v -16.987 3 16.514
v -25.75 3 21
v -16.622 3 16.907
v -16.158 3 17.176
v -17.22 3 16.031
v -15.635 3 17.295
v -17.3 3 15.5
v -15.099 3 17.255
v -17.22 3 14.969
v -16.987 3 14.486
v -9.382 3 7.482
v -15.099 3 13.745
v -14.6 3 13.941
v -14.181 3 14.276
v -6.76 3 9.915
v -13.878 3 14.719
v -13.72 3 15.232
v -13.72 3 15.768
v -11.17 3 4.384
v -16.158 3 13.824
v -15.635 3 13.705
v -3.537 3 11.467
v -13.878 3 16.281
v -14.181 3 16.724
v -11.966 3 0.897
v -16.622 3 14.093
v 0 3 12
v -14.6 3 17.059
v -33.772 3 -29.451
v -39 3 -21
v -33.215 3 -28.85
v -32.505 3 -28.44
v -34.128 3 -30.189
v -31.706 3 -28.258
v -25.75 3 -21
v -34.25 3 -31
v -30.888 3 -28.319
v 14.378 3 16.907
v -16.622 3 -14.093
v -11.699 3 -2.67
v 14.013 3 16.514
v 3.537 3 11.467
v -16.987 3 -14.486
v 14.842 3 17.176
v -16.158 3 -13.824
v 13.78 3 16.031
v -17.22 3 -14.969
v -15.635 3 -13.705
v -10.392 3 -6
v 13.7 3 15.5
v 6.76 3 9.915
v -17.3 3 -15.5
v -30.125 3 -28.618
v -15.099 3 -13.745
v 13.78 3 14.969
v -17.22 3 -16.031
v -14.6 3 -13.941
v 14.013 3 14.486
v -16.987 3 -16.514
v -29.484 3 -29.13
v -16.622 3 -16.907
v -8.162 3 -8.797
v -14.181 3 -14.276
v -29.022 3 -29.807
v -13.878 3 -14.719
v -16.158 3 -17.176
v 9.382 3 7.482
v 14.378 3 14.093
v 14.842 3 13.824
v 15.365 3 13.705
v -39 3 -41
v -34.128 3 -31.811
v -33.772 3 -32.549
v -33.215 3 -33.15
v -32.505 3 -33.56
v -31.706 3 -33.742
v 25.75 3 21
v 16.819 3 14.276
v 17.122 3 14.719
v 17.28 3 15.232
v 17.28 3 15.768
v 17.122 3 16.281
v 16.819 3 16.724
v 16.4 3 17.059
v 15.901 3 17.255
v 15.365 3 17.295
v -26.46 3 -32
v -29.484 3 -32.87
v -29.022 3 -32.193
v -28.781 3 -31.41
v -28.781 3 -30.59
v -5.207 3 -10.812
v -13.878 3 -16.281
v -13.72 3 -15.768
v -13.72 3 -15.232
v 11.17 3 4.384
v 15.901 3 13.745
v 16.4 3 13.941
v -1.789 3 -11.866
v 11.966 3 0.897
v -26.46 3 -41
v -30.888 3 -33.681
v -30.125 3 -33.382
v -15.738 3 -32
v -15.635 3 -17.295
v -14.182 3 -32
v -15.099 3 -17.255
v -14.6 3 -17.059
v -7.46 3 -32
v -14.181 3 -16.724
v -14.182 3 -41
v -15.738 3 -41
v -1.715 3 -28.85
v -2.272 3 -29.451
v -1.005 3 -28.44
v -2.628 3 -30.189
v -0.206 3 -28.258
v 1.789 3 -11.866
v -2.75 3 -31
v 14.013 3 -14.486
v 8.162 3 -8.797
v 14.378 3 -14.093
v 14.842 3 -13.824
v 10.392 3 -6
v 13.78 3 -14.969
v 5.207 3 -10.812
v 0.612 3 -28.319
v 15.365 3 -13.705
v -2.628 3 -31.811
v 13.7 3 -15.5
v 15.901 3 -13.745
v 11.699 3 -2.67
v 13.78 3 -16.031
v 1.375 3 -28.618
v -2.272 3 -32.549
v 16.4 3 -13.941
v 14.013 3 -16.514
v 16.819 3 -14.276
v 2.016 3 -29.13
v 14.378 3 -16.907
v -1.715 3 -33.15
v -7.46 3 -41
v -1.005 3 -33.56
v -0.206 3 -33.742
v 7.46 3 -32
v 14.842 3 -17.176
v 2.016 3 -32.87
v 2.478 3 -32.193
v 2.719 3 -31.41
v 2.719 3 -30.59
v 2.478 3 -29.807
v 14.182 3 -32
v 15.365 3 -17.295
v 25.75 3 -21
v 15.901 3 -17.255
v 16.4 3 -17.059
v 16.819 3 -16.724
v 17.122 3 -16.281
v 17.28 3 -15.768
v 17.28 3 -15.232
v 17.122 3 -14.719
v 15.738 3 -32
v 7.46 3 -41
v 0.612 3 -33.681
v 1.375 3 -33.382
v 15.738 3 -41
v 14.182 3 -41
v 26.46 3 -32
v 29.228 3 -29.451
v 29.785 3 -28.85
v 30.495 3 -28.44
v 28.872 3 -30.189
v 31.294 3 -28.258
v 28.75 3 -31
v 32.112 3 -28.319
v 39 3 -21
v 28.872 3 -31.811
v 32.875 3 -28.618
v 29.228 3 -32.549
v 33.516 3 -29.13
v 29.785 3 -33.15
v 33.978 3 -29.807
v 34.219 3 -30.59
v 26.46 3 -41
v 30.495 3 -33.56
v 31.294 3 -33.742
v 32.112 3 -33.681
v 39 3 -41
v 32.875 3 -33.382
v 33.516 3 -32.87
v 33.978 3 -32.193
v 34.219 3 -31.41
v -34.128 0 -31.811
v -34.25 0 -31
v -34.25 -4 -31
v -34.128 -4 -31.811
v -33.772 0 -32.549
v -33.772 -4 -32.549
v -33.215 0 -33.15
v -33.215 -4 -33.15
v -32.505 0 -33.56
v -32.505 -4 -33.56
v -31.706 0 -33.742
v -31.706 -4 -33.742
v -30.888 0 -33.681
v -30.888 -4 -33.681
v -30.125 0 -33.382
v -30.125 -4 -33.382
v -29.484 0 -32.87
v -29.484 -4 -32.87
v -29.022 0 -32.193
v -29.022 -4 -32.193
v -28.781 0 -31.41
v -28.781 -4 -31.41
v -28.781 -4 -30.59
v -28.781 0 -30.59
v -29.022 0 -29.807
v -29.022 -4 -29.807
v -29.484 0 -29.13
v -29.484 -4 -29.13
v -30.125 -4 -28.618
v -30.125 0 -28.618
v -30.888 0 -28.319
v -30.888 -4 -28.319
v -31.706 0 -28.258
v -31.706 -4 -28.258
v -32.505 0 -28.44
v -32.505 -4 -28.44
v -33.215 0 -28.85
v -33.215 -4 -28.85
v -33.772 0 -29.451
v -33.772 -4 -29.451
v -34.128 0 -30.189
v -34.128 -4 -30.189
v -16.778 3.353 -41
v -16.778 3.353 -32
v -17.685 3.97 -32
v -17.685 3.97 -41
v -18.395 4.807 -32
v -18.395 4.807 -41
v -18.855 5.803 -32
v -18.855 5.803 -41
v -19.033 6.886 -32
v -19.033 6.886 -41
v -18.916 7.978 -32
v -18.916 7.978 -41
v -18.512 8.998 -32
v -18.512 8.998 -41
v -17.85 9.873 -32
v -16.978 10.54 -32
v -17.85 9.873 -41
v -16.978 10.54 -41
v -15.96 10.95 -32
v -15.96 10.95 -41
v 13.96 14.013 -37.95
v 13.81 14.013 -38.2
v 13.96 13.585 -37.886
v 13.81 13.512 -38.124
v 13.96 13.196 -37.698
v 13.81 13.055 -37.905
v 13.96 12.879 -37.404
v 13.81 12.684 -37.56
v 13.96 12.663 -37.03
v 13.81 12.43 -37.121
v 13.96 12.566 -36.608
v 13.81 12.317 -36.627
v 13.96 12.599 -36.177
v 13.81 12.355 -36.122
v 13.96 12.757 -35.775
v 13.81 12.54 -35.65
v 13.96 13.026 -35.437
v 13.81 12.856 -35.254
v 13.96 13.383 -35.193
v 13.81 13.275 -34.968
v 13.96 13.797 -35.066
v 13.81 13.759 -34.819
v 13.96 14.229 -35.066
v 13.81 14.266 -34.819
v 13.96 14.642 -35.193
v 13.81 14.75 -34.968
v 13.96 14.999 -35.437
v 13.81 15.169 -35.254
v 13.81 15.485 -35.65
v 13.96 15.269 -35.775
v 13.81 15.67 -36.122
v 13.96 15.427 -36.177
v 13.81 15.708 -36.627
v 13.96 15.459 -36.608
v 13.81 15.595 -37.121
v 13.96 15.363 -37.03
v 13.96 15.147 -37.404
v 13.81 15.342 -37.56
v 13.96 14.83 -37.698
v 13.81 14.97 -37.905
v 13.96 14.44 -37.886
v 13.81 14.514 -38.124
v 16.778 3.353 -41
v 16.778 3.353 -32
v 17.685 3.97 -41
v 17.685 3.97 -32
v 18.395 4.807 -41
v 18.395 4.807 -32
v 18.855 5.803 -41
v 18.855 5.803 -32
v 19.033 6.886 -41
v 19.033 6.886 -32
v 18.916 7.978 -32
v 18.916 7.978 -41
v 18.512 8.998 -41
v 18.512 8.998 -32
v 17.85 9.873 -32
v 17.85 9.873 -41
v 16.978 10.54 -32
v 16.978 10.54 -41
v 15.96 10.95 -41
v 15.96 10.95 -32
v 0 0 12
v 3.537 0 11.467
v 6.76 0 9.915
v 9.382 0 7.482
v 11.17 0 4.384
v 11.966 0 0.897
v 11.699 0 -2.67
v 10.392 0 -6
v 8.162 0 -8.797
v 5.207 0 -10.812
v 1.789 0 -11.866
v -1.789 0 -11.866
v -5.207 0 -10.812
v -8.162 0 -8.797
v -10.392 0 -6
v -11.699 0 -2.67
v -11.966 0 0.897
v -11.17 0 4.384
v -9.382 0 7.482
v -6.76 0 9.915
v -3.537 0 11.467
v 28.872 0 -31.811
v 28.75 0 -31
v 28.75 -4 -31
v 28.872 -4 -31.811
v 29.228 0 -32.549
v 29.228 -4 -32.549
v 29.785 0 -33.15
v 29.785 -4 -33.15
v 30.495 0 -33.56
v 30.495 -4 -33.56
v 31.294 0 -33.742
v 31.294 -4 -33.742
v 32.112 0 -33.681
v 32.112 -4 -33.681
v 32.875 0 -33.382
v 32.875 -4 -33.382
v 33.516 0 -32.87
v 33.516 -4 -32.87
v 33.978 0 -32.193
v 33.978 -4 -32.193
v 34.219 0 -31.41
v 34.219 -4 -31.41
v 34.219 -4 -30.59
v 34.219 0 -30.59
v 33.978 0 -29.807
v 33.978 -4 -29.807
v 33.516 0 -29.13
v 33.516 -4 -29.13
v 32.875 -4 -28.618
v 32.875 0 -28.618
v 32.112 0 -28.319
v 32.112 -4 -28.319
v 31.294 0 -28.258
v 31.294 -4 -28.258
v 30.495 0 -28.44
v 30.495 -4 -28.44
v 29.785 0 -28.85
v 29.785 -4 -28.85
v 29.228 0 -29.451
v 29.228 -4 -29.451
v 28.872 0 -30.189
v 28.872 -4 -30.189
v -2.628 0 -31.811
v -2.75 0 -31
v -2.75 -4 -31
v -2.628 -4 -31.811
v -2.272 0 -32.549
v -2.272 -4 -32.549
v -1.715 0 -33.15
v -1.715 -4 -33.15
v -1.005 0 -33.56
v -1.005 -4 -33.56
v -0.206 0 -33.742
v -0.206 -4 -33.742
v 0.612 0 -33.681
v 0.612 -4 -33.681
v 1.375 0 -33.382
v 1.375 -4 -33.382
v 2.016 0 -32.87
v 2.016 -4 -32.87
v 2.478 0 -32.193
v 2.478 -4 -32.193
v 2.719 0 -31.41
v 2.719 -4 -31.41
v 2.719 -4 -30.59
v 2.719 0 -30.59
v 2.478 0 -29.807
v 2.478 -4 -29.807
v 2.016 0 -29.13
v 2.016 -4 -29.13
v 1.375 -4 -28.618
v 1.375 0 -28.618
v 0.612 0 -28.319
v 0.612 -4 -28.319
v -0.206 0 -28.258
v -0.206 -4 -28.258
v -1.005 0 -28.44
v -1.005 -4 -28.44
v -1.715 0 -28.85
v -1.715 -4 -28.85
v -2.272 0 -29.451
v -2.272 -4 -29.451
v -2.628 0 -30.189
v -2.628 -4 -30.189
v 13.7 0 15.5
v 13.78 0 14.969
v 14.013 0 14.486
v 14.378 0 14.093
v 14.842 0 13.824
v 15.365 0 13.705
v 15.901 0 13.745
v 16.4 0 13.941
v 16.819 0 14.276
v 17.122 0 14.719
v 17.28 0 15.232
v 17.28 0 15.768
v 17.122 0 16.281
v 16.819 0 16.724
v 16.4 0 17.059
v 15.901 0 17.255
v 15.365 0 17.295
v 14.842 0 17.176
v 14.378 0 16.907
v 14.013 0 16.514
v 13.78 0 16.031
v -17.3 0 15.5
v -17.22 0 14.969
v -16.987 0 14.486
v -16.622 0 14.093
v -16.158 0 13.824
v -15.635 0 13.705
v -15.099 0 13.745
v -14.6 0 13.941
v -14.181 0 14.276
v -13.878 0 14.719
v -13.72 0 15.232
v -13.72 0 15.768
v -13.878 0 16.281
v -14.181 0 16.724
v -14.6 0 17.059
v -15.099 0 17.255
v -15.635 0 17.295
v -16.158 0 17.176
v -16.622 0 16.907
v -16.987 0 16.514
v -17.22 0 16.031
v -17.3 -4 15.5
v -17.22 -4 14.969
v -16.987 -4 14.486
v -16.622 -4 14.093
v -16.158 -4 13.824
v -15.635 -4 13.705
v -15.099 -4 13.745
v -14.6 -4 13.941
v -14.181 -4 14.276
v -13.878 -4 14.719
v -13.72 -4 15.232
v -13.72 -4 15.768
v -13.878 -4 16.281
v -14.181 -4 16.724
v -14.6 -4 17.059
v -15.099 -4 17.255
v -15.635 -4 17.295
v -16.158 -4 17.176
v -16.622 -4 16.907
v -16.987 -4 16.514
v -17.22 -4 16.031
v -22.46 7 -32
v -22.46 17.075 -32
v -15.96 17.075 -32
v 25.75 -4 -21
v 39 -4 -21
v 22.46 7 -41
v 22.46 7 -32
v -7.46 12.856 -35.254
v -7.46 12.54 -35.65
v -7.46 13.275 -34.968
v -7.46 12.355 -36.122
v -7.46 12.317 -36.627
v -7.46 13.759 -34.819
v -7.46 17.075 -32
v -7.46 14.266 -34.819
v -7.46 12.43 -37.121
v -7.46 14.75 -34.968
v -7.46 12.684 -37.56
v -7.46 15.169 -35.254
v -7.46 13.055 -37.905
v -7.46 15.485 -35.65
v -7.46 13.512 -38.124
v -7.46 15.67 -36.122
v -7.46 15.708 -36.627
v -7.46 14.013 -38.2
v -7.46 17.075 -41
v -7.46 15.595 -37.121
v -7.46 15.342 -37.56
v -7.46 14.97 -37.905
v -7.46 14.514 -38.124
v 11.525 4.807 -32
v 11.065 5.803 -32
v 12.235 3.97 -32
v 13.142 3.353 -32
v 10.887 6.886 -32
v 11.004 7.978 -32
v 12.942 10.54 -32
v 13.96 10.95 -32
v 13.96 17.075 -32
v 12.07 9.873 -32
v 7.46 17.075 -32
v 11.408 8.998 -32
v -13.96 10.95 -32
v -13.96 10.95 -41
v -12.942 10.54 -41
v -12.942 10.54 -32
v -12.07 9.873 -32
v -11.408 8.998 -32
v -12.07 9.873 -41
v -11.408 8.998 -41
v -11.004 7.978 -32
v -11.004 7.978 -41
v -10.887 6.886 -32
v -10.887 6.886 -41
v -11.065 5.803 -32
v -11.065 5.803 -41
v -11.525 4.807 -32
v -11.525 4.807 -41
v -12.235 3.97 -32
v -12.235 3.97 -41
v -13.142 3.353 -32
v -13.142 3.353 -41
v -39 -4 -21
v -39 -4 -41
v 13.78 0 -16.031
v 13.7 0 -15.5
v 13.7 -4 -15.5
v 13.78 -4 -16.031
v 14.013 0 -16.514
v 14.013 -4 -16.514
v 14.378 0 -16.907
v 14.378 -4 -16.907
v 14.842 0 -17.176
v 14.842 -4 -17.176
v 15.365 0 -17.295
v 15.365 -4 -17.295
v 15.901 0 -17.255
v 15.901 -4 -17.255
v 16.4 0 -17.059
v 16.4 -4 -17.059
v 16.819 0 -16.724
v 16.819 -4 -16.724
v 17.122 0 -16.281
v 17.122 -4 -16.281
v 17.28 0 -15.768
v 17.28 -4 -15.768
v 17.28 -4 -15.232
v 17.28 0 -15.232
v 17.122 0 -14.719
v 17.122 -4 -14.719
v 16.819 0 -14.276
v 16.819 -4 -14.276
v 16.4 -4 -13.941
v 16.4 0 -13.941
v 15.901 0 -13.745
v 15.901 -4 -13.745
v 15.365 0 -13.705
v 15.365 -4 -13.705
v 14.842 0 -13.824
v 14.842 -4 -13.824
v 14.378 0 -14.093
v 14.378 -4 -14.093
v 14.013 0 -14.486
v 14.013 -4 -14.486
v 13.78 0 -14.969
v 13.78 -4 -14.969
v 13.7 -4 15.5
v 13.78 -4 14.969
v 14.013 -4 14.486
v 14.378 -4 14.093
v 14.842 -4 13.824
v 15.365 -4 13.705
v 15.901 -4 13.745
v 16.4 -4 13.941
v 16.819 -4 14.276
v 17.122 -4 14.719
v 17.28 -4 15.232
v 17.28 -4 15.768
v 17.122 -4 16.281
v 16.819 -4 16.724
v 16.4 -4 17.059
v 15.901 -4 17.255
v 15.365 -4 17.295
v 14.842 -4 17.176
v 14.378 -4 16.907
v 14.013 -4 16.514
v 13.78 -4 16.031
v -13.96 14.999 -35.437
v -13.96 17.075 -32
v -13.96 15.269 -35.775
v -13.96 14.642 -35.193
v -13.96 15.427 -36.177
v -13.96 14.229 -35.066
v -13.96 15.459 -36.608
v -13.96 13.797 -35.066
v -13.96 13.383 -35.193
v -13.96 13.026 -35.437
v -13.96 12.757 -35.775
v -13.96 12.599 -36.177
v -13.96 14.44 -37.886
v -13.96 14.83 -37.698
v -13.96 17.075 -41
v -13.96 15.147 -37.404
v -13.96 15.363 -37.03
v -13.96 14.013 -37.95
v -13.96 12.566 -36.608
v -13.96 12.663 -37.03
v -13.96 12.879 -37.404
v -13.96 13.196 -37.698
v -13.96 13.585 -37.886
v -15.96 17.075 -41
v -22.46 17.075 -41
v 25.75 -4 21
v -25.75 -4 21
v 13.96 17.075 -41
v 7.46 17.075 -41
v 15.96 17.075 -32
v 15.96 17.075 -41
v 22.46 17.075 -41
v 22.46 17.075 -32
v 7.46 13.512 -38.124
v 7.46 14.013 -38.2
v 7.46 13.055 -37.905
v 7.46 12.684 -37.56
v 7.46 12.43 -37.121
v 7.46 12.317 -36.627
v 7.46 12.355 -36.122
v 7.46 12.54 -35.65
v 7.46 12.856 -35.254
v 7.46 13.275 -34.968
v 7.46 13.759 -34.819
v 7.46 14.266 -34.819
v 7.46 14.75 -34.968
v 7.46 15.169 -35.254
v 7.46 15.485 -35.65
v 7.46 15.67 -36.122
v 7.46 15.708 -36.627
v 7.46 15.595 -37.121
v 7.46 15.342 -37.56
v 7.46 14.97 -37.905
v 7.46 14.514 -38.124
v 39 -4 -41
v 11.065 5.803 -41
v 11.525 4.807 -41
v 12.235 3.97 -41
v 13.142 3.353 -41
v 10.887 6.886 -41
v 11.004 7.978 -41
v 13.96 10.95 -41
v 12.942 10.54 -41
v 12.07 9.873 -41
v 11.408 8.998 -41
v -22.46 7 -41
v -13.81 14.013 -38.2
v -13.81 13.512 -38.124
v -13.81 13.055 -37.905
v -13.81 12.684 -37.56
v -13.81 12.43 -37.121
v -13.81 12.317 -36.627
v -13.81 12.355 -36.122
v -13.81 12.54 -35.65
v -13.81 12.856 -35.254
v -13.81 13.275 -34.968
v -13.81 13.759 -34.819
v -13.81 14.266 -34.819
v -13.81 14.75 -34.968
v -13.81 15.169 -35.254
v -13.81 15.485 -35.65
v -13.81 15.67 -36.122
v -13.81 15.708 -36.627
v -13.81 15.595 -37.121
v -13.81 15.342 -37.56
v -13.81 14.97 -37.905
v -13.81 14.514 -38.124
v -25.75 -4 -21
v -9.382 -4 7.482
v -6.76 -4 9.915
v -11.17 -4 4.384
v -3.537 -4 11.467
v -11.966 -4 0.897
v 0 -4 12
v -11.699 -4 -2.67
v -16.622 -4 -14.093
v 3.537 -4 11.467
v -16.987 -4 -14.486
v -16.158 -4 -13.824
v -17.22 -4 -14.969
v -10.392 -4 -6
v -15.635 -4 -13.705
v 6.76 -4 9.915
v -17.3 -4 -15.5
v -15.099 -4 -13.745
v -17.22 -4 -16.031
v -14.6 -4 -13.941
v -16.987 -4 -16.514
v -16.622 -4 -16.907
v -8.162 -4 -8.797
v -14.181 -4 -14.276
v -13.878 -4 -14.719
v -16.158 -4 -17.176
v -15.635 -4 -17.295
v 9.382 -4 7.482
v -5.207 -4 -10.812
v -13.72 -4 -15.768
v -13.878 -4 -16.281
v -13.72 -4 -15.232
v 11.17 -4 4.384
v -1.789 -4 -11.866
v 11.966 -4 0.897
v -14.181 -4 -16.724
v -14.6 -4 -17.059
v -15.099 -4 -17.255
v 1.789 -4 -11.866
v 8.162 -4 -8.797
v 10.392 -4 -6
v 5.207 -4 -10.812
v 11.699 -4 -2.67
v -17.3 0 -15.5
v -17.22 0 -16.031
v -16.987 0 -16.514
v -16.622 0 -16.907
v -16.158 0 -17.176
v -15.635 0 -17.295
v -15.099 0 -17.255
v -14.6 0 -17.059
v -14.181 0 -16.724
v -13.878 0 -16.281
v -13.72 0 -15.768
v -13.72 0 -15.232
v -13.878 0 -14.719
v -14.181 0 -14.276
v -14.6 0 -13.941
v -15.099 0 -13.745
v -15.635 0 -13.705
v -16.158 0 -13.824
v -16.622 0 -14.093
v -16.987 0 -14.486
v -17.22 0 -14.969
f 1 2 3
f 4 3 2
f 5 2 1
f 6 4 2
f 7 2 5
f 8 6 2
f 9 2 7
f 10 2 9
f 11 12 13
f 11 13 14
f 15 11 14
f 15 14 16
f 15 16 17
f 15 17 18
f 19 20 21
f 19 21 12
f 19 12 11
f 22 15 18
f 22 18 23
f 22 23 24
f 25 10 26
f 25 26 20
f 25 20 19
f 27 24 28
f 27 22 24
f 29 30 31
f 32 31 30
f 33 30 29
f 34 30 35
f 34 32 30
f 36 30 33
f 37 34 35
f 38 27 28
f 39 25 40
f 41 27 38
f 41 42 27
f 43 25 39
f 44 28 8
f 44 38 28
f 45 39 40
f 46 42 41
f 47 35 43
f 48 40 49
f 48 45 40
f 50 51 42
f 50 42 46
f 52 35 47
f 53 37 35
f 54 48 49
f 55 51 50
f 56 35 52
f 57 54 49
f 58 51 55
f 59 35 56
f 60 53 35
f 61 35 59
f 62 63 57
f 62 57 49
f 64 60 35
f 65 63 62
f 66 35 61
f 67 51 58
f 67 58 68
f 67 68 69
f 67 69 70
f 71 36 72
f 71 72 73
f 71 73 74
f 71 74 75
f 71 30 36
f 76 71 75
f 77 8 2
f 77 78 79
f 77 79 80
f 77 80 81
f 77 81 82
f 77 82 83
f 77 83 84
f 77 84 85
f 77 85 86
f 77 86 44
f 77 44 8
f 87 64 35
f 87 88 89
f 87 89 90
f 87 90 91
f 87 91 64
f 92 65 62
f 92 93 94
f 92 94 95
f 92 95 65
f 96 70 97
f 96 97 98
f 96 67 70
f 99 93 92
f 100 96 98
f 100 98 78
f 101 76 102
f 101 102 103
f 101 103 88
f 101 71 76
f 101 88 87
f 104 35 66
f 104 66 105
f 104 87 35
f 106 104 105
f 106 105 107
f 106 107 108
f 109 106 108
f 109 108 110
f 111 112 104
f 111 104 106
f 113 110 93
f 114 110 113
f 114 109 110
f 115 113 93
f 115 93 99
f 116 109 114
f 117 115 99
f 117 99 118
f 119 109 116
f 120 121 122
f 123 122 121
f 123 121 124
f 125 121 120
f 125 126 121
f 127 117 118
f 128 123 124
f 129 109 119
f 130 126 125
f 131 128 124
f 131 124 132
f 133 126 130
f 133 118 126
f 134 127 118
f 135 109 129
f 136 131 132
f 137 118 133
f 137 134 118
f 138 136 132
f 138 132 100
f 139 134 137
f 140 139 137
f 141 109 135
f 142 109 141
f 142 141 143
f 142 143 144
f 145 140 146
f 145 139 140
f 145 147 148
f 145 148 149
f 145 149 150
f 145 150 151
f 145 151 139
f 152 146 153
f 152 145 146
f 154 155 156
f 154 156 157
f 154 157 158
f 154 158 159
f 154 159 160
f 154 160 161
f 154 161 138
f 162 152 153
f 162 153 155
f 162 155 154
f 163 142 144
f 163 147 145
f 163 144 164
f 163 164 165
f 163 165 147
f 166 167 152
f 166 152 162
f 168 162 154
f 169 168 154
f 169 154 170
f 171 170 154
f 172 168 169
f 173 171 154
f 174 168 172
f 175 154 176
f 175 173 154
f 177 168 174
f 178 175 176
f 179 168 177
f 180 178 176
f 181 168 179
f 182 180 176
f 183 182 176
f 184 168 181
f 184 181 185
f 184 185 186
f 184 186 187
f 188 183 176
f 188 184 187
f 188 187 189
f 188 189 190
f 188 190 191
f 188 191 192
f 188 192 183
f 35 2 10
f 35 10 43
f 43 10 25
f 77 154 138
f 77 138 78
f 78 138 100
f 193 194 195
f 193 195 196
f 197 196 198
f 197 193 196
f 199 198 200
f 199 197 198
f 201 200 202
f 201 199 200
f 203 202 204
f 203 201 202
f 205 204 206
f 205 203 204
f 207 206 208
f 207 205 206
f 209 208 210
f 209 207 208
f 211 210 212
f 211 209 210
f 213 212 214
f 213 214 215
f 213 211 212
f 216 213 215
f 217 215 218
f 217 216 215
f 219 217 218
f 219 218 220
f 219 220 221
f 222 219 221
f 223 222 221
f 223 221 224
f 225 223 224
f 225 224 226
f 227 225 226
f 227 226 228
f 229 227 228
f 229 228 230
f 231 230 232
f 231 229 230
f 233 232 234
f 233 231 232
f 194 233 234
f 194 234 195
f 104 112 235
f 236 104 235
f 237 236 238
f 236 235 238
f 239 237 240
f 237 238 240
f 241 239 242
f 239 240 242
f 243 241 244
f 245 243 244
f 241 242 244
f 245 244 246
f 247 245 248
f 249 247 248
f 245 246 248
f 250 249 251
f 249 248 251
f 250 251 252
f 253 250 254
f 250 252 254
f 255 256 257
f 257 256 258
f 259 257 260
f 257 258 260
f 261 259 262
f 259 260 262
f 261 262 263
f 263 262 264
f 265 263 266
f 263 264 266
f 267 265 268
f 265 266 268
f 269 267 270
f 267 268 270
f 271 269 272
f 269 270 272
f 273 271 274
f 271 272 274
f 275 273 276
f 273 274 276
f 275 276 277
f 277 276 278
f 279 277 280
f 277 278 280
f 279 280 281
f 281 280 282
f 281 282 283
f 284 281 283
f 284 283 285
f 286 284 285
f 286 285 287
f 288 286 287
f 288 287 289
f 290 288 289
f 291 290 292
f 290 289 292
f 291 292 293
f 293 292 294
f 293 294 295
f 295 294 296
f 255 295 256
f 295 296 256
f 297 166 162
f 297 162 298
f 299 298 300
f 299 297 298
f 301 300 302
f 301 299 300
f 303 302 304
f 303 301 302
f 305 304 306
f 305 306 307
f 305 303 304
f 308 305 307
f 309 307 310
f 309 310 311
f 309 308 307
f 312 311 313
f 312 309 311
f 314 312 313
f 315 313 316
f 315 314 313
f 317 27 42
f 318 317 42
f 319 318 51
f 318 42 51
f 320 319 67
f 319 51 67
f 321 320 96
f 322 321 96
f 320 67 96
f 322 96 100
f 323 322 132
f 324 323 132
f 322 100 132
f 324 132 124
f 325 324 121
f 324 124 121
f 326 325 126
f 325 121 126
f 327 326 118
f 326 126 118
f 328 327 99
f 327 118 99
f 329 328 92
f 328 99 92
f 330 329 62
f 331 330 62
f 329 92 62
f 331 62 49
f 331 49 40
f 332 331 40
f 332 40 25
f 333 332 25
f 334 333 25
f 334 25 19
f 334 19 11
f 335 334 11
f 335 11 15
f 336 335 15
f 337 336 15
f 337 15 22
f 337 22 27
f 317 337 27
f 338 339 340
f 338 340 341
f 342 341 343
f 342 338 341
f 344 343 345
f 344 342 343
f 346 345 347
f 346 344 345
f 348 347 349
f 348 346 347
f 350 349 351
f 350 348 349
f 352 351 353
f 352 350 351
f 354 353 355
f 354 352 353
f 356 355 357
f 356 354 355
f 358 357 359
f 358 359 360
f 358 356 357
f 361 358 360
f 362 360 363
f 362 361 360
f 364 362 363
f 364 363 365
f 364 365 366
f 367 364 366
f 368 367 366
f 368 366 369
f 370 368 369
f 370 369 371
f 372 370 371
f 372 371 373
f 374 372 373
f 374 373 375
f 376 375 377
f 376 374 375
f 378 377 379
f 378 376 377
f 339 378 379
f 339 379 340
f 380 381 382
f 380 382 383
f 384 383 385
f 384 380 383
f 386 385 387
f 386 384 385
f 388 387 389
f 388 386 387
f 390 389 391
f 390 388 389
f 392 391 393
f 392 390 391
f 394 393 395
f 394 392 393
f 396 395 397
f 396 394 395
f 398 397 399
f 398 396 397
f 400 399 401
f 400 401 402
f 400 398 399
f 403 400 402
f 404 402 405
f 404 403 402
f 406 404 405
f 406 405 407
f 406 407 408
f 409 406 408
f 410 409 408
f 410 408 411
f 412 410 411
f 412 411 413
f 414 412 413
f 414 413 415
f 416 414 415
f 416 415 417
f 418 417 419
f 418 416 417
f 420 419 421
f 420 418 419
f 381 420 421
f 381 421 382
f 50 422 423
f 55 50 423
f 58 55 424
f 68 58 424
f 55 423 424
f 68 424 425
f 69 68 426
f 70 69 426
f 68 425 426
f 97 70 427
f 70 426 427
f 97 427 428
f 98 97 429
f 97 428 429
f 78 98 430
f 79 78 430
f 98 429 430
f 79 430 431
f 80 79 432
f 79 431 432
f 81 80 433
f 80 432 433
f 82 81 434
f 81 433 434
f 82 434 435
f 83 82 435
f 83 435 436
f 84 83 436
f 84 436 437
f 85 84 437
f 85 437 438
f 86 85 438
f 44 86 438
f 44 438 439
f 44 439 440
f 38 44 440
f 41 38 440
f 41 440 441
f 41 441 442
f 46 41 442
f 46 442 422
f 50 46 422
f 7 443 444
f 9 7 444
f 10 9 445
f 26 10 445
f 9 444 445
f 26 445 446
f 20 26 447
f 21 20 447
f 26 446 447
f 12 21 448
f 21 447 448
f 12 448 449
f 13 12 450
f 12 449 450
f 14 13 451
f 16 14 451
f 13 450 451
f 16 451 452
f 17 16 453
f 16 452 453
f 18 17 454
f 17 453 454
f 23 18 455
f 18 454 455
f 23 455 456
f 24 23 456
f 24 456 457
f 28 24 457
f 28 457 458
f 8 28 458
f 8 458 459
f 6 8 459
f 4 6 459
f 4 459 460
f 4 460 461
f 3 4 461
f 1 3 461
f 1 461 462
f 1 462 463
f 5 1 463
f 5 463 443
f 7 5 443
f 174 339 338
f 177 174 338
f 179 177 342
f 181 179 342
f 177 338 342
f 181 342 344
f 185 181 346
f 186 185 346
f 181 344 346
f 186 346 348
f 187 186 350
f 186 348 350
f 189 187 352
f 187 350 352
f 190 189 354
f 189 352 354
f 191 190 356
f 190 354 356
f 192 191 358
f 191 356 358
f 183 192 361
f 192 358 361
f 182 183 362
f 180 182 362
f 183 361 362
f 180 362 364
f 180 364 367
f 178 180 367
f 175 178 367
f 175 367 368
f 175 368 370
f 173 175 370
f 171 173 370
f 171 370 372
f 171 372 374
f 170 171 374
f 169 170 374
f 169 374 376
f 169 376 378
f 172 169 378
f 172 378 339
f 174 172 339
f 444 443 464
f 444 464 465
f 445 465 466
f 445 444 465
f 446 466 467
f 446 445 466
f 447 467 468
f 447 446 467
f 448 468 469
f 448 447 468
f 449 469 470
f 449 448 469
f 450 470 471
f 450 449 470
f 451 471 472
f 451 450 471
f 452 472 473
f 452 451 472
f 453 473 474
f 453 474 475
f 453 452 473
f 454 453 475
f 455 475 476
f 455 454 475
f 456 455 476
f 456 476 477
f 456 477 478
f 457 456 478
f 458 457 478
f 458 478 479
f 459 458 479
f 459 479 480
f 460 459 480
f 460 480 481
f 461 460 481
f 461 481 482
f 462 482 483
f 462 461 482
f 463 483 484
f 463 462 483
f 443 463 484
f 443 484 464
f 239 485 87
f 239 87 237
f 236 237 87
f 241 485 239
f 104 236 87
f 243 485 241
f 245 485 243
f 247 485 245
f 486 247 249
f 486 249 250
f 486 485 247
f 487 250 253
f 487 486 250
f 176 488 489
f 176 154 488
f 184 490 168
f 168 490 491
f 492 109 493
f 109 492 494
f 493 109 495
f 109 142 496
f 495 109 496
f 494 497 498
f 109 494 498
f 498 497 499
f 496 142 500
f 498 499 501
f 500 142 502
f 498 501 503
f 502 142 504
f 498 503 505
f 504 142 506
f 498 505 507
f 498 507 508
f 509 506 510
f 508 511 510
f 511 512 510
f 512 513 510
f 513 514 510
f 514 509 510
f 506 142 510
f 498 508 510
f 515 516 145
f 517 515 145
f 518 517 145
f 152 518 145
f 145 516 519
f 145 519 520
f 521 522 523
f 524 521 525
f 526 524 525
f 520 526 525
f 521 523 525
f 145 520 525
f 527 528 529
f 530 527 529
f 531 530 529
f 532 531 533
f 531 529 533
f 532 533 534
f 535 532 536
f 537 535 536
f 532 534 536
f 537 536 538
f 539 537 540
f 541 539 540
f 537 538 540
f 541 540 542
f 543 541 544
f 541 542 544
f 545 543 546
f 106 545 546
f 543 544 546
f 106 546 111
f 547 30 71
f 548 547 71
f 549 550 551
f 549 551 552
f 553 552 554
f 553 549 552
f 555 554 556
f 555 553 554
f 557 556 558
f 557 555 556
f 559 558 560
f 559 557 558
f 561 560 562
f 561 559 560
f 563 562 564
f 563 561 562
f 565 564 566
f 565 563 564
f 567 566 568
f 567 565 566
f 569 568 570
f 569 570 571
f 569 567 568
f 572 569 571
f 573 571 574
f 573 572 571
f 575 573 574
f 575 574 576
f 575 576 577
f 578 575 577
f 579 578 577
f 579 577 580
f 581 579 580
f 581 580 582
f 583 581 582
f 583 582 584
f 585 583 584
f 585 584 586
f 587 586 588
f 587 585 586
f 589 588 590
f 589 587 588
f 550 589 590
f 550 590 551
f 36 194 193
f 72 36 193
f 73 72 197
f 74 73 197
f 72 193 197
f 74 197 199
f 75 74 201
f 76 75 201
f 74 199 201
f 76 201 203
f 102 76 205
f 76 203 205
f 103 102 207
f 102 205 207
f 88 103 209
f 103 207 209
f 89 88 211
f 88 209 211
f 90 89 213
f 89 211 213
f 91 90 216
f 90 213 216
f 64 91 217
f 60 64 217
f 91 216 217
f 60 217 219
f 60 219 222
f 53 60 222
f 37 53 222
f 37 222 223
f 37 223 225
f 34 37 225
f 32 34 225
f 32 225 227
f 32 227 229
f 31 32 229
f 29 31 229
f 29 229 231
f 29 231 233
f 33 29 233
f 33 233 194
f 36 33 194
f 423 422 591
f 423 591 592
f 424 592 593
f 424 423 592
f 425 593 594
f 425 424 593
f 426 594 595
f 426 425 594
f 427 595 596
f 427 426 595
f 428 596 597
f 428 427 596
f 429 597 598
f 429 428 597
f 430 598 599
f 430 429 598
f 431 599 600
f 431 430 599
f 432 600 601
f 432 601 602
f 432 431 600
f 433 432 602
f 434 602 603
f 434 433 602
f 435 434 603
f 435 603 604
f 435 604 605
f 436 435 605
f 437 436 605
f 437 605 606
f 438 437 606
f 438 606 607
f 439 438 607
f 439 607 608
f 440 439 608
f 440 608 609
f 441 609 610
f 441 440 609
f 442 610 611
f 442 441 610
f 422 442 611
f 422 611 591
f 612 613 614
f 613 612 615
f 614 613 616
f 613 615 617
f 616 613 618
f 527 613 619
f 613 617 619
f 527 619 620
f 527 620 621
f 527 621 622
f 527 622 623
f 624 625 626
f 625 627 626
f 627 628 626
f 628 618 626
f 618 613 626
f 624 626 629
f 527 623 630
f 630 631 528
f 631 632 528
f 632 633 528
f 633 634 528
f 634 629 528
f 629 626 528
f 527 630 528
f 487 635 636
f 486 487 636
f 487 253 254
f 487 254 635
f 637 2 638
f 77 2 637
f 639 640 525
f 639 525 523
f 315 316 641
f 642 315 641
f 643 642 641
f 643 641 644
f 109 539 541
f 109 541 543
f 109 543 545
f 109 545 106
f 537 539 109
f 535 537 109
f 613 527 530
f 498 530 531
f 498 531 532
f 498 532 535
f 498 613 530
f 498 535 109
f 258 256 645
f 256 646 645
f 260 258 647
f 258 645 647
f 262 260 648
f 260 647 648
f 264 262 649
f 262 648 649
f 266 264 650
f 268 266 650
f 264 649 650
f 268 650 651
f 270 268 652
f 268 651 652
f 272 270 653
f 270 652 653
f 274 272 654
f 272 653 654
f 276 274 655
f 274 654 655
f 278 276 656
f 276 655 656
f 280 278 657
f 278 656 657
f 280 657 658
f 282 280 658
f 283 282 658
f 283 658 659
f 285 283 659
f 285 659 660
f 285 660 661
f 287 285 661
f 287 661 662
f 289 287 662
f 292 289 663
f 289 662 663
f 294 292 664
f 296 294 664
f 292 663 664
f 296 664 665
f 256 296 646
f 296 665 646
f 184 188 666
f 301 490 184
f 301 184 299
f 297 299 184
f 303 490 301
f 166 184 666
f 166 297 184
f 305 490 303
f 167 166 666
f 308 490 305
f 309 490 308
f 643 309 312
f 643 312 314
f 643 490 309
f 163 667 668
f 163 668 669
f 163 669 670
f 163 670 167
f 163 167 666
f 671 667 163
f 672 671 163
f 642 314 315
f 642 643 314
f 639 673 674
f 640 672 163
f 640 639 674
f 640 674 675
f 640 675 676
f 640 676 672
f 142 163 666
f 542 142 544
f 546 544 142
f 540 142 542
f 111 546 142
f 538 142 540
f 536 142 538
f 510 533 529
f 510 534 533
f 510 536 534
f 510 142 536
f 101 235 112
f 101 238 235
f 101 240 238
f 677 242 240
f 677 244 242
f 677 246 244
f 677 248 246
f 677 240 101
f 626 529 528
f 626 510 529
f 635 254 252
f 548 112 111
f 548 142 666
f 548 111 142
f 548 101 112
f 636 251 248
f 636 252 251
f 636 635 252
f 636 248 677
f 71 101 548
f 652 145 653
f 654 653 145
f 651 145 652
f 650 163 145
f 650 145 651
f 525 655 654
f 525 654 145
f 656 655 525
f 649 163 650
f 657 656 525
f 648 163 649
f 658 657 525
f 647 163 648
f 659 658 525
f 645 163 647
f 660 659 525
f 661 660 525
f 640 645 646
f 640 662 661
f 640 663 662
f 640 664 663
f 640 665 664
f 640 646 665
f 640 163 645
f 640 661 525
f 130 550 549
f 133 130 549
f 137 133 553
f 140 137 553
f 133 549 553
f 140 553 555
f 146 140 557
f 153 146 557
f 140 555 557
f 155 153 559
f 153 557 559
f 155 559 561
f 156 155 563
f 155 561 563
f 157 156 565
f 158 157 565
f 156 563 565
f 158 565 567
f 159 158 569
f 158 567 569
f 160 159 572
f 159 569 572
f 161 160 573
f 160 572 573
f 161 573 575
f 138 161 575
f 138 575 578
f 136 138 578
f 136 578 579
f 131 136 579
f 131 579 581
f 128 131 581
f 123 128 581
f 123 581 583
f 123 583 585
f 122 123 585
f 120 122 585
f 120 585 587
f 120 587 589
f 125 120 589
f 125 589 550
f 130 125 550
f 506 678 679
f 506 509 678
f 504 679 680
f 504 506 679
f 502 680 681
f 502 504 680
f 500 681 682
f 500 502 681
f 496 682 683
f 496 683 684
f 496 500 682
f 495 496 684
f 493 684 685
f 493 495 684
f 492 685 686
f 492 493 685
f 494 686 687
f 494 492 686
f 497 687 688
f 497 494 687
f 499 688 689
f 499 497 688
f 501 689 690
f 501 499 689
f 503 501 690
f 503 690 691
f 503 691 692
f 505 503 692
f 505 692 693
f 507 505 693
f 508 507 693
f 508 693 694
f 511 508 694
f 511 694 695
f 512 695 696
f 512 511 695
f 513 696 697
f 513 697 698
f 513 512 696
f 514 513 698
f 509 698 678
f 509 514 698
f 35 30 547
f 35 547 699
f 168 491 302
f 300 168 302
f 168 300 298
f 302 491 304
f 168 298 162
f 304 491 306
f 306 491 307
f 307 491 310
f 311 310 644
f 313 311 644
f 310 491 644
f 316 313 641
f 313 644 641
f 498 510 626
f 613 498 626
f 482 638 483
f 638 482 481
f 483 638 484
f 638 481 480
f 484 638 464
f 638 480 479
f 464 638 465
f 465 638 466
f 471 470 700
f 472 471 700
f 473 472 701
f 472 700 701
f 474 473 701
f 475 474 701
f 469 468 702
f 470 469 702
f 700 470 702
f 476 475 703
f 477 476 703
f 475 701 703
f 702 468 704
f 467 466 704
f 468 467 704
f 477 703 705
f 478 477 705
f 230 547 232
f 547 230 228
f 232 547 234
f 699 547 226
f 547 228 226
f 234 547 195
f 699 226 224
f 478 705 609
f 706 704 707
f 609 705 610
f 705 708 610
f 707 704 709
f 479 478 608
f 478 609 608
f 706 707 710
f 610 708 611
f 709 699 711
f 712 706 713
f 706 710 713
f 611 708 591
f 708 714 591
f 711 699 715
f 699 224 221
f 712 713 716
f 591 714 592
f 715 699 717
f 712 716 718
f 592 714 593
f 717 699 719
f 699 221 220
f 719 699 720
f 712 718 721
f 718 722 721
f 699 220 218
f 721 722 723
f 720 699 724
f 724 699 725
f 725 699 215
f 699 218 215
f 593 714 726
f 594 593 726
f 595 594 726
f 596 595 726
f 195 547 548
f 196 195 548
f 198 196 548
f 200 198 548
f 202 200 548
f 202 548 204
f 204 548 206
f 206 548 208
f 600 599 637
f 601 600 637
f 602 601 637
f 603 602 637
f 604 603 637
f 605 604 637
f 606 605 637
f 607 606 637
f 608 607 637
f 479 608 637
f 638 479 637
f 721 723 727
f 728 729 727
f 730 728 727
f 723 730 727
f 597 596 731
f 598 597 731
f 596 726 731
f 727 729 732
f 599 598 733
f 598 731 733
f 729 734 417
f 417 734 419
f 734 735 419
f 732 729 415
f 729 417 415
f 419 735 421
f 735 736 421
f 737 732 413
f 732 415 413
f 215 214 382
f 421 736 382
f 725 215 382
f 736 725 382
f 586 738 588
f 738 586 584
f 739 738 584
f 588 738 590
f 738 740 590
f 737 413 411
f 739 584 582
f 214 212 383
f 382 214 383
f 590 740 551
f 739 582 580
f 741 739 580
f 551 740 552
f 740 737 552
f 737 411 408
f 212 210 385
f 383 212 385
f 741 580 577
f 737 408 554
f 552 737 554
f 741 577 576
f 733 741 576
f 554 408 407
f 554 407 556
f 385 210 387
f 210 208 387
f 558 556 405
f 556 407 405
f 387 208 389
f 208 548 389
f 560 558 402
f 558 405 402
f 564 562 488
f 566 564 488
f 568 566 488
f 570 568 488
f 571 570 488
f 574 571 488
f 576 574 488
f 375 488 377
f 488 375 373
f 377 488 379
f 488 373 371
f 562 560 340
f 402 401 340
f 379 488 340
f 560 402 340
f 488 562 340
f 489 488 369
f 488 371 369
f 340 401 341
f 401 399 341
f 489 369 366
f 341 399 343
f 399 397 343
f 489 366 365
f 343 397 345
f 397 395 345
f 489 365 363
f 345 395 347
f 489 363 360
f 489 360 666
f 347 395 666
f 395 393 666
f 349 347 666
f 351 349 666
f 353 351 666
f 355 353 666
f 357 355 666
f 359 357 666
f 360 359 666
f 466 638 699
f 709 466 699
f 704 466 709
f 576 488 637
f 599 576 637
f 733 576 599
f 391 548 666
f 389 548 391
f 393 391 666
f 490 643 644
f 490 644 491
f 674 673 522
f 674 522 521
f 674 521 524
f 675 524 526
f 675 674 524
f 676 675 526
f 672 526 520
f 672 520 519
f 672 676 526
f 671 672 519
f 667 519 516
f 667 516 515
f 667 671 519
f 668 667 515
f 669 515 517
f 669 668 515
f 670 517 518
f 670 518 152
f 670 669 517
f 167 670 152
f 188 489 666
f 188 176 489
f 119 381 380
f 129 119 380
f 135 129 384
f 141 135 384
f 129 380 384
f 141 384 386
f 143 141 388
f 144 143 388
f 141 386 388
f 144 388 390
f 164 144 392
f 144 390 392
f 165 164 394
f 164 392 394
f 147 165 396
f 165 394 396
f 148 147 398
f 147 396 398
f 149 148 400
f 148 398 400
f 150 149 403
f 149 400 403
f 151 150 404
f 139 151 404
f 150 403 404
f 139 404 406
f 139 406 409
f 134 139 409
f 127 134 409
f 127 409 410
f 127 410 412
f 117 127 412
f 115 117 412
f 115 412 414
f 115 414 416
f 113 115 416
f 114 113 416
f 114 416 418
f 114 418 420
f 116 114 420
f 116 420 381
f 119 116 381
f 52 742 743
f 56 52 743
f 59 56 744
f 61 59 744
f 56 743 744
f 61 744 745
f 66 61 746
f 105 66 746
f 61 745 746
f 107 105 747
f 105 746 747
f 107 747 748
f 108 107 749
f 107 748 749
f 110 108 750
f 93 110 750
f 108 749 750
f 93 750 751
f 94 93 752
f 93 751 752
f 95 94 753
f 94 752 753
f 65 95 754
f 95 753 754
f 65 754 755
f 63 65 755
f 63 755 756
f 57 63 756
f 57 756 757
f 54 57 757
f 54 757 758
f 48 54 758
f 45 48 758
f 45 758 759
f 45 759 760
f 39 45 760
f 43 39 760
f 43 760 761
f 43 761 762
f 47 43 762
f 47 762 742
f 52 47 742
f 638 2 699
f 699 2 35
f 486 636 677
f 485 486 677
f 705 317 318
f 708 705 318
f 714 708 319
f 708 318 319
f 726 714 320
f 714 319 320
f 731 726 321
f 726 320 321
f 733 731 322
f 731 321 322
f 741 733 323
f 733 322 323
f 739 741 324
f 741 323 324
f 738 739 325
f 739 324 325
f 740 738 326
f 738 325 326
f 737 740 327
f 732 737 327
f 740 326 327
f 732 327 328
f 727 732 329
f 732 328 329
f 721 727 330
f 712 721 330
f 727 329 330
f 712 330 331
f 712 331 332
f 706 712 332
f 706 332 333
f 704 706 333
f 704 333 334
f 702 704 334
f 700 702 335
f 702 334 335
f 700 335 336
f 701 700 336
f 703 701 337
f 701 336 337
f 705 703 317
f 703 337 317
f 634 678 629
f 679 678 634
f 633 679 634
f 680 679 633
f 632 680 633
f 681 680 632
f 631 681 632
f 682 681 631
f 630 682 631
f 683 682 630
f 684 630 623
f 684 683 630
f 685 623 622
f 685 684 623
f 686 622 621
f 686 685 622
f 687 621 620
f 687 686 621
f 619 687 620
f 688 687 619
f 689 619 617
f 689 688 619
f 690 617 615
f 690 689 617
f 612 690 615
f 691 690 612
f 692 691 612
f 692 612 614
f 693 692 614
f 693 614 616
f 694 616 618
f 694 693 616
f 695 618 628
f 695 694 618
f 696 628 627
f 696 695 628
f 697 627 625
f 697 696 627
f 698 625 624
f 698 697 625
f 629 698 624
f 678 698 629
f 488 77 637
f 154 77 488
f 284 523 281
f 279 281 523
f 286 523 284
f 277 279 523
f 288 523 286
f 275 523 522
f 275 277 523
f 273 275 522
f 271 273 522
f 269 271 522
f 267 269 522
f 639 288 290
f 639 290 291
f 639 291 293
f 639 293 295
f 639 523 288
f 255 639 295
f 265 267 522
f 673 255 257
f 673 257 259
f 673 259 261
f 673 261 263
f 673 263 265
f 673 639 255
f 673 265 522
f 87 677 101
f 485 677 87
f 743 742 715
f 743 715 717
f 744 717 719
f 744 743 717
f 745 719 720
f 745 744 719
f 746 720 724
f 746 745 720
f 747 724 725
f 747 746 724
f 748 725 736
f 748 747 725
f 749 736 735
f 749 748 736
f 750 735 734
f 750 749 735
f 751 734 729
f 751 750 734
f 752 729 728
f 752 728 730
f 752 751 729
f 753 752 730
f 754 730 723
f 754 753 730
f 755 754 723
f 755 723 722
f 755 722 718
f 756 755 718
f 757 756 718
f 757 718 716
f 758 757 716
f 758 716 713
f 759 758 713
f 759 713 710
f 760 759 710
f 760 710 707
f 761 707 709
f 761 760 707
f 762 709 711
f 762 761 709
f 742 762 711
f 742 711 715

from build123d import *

# Parameters (mm, degrees)
SKETCH1_W            = 42
SKETCH1_H            = 42
BOSS_EXTRUDE1_DEPTH  = 3
M3_CLEARANCE_HOLE1_D = 3.6
SKETCH4_R            = 12
CUT_EXTRUDE1_DEPTH   = 30.849623113
BOSS_EXTRUDE2_START  = -34
SKETCH5_R            = 4
BOSS_EXTRUDE2_DEPTH  = 20
SKETCH6_W            = 42
SKETCH6_H            = 20
BOSS_EXTRUDE3_DEPTH  = 3
SKETCH7_W            = 4.75
SKETCH7_H            = 62
BOSS_EXTRUDE4_DEPTH  = 3
BOSS_EXTRUDE5_START  = -7
BOSS_EXTRUDE5_DEPTH  = 9
SKETCH13_W           = 13.25
SKETCH13_H           = 20
BOSS_EXTRUDE6_DEPTH  = 3
M5_CLEARANCE_HOLE1_D = 5.5
CHAMFER1_SIZE        = 4
MOVE_FACE1_BY        = 4


with BuildPart() as part:
    # Sketch1 → Boss-Extrude1 (new body)
    with BuildSketch(Plane(origin=(0, 0, 0), x_dir=(1, 0, 0), z_dir=(0, 1, 0))):
        Rectangle(SKETCH1_W, SKETCH1_H)
    extrude(amount=BOSS_EXTRUDE1_DEPTH)

    # M3 Clearance Hole1 (through all)
    with Locations(Plane(origin=(0, 3, 0), x_dir=(1, 0, 0), z_dir=(0, 1, 0))):
        with Locations((-15.5, 15.5), (-15.5, -15.5), (15.5, -15.5), (15.5, 15.5)):
            Hole(M3_CLEARANCE_HOLE1_D / 2)

    # Sketch4 → Cut-Extrude1 (cut, through all)
    with BuildSketch(Plane(origin=(0, 3, 0), x_dir=(1, 0, 0), z_dir=(0, 1, 0))):
        with Locations(Location((0, 0, 0), (0, 0, 270))):
            Circle(SKETCH4_R)
    extrude(amount=-CUT_EXTRUDE1_DEPTH, mode=Mode.SUBTRACT)

    # Sketch6 → Boss-Extrude3 (add)
    with BuildSketch(Plane(origin=(0, 0, 0), x_dir=(1, 0, 0), z_dir=(0, 1, 0))):
        with Locations((0, 31)):
            Rectangle(SKETCH6_W, SKETCH6_H)
    extrude(amount=BOSS_EXTRUDE3_DEPTH)

    # Sketch7 → Boss-Extrude4 (add)
    with BuildSketch(Plane(origin=(0, 0, 0), x_dir=(1, 0, 0), z_dir=(0, 1, 0))):
        with Locations((-23.375, 10)):
            Rectangle(SKETCH7_W, SKETCH7_H)
        with Locations((23.375, 10)):
            Rectangle(SKETCH7_W, SKETCH7_H)
    extrude(amount=BOSS_EXTRUDE4_DEPTH)

    # Sketch8 → Boss-Extrude5 (add)
    with BuildSketch(Plane.XY.offset(-34).offset(BOSS_EXTRUDE5_START)):
        with BuildLine():
            Line((-22.46, 17.075), (-22.46, 3))
            Line((-22.46, 3), (-15.738219121, 3))
            ThreePointArc((-15.738219121, 3), (-19.033415417, 6.886369723), (-15.96, 10.95039555))
            Line((-15.96, 10.95039555), (-15.96, 17.075))
            Line((-15.96, 17.075), (-22.46, 17.075))
        make_face()
        with BuildLine():
            ThreePointArc((-13.96, 10.95039555), (-10.886584583, 6.886369723), (-14.181780879, 3))
            Line((-14.181780879, 3), (-7.46, 3))
            Line((-7.46, 3), (-7.46, 17.075))
            Line((-7.46, 17.075), (-13.96, 17.075))
            Line((-13.96, 17.075), (-13.96, 10.95039555))
        make_face()
    boss_extrude5 = extrude(amount=BOSS_EXTRUDE5_DEPTH)

    # Sketch10 → M3 Clearance Hole2 (revolve, cut)
    with BuildSketch(Plane(origin=(-7.46, 14.012697775, -36.5), x_dir=(0, 0, -1), z_dir=(0, 1, 0))):
        Polygon((0, 0), (0, 7.371463052), (1.7, 6.35), (1.7, 0), align=None)
    m3_clearance_hole2 = revolve(axis=Axis((-1.11, 14.012697775, -36.5), (-1, 0, 0)), mode=Mode.SUBTRACT)

    # Mirror2: Boss-Extrude5, M3 Clearance Hole2 across plane
    add(boss_extrude5.mirror(Plane(origin=(0, 0, 0), x_dir=(0, 0, 1), z_dir=(1, 0, 0))))
    add(m3_clearance_hole2.mirror(Plane(origin=(0, 0, 0), x_dir=(0, 0, 1), z_dir=(1, 0, 0))), mode=Mode.SUBTRACT)

    # Sketch13 → Boss-Extrude6 (add)
    with BuildSketch(Plane(origin=(0, 3, 0), x_dir=(1, 0, 0), z_dir=(0, 1, 0))):
        with Locations((-32.375, 31)):
            Rectangle(SKETCH13_W, SKETCH13_H)
        with Locations((32.375, 31)):
            Rectangle(SKETCH13_W, SKETCH13_H)
    extrude(amount=-BOSS_EXTRUDE6_DEPTH)

    # M5 Clearance Hole1 (through all)
    with Locations(Plane(origin=(0, 3, 0), x_dir=(1, 0, 0), z_dir=(0, 1, 0))):
        with Locations((0, 31), (-31.5, 31), (31.5, 31)):
            Hole(M5_CLEARANCE_HOLE1_D / 2)

    # Chamfer1
    chamfer1_edges = [part.edges().sort_by_distance(p)[0] for p in [
        (22.46, 3, -36.5),
        (-22.46, 3, -36.5),
    ]]
    chamfer(chamfer1_edges, length=CHAMFER1_SIZE)

    # Move Face1: a face moved outward by 4.0
    extrude(part.faces().sort_by_distance((0, 0, -14.610959183))[0], amount=MOVE_FACE1_BY, dir=(0, -1, 0))


with BuildPart() as body_2:
    # Sketch5 → Boss-Extrude2 (new body)
    with BuildSketch(Plane.XY.offset(BOSS_EXTRUDE2_START)):
        with Locations((-14.96, 7)):
            Circle(SKETCH5_R)
    extrude(amount=-BOSS_EXTRUDE2_DEPTH)


solid = part.part
